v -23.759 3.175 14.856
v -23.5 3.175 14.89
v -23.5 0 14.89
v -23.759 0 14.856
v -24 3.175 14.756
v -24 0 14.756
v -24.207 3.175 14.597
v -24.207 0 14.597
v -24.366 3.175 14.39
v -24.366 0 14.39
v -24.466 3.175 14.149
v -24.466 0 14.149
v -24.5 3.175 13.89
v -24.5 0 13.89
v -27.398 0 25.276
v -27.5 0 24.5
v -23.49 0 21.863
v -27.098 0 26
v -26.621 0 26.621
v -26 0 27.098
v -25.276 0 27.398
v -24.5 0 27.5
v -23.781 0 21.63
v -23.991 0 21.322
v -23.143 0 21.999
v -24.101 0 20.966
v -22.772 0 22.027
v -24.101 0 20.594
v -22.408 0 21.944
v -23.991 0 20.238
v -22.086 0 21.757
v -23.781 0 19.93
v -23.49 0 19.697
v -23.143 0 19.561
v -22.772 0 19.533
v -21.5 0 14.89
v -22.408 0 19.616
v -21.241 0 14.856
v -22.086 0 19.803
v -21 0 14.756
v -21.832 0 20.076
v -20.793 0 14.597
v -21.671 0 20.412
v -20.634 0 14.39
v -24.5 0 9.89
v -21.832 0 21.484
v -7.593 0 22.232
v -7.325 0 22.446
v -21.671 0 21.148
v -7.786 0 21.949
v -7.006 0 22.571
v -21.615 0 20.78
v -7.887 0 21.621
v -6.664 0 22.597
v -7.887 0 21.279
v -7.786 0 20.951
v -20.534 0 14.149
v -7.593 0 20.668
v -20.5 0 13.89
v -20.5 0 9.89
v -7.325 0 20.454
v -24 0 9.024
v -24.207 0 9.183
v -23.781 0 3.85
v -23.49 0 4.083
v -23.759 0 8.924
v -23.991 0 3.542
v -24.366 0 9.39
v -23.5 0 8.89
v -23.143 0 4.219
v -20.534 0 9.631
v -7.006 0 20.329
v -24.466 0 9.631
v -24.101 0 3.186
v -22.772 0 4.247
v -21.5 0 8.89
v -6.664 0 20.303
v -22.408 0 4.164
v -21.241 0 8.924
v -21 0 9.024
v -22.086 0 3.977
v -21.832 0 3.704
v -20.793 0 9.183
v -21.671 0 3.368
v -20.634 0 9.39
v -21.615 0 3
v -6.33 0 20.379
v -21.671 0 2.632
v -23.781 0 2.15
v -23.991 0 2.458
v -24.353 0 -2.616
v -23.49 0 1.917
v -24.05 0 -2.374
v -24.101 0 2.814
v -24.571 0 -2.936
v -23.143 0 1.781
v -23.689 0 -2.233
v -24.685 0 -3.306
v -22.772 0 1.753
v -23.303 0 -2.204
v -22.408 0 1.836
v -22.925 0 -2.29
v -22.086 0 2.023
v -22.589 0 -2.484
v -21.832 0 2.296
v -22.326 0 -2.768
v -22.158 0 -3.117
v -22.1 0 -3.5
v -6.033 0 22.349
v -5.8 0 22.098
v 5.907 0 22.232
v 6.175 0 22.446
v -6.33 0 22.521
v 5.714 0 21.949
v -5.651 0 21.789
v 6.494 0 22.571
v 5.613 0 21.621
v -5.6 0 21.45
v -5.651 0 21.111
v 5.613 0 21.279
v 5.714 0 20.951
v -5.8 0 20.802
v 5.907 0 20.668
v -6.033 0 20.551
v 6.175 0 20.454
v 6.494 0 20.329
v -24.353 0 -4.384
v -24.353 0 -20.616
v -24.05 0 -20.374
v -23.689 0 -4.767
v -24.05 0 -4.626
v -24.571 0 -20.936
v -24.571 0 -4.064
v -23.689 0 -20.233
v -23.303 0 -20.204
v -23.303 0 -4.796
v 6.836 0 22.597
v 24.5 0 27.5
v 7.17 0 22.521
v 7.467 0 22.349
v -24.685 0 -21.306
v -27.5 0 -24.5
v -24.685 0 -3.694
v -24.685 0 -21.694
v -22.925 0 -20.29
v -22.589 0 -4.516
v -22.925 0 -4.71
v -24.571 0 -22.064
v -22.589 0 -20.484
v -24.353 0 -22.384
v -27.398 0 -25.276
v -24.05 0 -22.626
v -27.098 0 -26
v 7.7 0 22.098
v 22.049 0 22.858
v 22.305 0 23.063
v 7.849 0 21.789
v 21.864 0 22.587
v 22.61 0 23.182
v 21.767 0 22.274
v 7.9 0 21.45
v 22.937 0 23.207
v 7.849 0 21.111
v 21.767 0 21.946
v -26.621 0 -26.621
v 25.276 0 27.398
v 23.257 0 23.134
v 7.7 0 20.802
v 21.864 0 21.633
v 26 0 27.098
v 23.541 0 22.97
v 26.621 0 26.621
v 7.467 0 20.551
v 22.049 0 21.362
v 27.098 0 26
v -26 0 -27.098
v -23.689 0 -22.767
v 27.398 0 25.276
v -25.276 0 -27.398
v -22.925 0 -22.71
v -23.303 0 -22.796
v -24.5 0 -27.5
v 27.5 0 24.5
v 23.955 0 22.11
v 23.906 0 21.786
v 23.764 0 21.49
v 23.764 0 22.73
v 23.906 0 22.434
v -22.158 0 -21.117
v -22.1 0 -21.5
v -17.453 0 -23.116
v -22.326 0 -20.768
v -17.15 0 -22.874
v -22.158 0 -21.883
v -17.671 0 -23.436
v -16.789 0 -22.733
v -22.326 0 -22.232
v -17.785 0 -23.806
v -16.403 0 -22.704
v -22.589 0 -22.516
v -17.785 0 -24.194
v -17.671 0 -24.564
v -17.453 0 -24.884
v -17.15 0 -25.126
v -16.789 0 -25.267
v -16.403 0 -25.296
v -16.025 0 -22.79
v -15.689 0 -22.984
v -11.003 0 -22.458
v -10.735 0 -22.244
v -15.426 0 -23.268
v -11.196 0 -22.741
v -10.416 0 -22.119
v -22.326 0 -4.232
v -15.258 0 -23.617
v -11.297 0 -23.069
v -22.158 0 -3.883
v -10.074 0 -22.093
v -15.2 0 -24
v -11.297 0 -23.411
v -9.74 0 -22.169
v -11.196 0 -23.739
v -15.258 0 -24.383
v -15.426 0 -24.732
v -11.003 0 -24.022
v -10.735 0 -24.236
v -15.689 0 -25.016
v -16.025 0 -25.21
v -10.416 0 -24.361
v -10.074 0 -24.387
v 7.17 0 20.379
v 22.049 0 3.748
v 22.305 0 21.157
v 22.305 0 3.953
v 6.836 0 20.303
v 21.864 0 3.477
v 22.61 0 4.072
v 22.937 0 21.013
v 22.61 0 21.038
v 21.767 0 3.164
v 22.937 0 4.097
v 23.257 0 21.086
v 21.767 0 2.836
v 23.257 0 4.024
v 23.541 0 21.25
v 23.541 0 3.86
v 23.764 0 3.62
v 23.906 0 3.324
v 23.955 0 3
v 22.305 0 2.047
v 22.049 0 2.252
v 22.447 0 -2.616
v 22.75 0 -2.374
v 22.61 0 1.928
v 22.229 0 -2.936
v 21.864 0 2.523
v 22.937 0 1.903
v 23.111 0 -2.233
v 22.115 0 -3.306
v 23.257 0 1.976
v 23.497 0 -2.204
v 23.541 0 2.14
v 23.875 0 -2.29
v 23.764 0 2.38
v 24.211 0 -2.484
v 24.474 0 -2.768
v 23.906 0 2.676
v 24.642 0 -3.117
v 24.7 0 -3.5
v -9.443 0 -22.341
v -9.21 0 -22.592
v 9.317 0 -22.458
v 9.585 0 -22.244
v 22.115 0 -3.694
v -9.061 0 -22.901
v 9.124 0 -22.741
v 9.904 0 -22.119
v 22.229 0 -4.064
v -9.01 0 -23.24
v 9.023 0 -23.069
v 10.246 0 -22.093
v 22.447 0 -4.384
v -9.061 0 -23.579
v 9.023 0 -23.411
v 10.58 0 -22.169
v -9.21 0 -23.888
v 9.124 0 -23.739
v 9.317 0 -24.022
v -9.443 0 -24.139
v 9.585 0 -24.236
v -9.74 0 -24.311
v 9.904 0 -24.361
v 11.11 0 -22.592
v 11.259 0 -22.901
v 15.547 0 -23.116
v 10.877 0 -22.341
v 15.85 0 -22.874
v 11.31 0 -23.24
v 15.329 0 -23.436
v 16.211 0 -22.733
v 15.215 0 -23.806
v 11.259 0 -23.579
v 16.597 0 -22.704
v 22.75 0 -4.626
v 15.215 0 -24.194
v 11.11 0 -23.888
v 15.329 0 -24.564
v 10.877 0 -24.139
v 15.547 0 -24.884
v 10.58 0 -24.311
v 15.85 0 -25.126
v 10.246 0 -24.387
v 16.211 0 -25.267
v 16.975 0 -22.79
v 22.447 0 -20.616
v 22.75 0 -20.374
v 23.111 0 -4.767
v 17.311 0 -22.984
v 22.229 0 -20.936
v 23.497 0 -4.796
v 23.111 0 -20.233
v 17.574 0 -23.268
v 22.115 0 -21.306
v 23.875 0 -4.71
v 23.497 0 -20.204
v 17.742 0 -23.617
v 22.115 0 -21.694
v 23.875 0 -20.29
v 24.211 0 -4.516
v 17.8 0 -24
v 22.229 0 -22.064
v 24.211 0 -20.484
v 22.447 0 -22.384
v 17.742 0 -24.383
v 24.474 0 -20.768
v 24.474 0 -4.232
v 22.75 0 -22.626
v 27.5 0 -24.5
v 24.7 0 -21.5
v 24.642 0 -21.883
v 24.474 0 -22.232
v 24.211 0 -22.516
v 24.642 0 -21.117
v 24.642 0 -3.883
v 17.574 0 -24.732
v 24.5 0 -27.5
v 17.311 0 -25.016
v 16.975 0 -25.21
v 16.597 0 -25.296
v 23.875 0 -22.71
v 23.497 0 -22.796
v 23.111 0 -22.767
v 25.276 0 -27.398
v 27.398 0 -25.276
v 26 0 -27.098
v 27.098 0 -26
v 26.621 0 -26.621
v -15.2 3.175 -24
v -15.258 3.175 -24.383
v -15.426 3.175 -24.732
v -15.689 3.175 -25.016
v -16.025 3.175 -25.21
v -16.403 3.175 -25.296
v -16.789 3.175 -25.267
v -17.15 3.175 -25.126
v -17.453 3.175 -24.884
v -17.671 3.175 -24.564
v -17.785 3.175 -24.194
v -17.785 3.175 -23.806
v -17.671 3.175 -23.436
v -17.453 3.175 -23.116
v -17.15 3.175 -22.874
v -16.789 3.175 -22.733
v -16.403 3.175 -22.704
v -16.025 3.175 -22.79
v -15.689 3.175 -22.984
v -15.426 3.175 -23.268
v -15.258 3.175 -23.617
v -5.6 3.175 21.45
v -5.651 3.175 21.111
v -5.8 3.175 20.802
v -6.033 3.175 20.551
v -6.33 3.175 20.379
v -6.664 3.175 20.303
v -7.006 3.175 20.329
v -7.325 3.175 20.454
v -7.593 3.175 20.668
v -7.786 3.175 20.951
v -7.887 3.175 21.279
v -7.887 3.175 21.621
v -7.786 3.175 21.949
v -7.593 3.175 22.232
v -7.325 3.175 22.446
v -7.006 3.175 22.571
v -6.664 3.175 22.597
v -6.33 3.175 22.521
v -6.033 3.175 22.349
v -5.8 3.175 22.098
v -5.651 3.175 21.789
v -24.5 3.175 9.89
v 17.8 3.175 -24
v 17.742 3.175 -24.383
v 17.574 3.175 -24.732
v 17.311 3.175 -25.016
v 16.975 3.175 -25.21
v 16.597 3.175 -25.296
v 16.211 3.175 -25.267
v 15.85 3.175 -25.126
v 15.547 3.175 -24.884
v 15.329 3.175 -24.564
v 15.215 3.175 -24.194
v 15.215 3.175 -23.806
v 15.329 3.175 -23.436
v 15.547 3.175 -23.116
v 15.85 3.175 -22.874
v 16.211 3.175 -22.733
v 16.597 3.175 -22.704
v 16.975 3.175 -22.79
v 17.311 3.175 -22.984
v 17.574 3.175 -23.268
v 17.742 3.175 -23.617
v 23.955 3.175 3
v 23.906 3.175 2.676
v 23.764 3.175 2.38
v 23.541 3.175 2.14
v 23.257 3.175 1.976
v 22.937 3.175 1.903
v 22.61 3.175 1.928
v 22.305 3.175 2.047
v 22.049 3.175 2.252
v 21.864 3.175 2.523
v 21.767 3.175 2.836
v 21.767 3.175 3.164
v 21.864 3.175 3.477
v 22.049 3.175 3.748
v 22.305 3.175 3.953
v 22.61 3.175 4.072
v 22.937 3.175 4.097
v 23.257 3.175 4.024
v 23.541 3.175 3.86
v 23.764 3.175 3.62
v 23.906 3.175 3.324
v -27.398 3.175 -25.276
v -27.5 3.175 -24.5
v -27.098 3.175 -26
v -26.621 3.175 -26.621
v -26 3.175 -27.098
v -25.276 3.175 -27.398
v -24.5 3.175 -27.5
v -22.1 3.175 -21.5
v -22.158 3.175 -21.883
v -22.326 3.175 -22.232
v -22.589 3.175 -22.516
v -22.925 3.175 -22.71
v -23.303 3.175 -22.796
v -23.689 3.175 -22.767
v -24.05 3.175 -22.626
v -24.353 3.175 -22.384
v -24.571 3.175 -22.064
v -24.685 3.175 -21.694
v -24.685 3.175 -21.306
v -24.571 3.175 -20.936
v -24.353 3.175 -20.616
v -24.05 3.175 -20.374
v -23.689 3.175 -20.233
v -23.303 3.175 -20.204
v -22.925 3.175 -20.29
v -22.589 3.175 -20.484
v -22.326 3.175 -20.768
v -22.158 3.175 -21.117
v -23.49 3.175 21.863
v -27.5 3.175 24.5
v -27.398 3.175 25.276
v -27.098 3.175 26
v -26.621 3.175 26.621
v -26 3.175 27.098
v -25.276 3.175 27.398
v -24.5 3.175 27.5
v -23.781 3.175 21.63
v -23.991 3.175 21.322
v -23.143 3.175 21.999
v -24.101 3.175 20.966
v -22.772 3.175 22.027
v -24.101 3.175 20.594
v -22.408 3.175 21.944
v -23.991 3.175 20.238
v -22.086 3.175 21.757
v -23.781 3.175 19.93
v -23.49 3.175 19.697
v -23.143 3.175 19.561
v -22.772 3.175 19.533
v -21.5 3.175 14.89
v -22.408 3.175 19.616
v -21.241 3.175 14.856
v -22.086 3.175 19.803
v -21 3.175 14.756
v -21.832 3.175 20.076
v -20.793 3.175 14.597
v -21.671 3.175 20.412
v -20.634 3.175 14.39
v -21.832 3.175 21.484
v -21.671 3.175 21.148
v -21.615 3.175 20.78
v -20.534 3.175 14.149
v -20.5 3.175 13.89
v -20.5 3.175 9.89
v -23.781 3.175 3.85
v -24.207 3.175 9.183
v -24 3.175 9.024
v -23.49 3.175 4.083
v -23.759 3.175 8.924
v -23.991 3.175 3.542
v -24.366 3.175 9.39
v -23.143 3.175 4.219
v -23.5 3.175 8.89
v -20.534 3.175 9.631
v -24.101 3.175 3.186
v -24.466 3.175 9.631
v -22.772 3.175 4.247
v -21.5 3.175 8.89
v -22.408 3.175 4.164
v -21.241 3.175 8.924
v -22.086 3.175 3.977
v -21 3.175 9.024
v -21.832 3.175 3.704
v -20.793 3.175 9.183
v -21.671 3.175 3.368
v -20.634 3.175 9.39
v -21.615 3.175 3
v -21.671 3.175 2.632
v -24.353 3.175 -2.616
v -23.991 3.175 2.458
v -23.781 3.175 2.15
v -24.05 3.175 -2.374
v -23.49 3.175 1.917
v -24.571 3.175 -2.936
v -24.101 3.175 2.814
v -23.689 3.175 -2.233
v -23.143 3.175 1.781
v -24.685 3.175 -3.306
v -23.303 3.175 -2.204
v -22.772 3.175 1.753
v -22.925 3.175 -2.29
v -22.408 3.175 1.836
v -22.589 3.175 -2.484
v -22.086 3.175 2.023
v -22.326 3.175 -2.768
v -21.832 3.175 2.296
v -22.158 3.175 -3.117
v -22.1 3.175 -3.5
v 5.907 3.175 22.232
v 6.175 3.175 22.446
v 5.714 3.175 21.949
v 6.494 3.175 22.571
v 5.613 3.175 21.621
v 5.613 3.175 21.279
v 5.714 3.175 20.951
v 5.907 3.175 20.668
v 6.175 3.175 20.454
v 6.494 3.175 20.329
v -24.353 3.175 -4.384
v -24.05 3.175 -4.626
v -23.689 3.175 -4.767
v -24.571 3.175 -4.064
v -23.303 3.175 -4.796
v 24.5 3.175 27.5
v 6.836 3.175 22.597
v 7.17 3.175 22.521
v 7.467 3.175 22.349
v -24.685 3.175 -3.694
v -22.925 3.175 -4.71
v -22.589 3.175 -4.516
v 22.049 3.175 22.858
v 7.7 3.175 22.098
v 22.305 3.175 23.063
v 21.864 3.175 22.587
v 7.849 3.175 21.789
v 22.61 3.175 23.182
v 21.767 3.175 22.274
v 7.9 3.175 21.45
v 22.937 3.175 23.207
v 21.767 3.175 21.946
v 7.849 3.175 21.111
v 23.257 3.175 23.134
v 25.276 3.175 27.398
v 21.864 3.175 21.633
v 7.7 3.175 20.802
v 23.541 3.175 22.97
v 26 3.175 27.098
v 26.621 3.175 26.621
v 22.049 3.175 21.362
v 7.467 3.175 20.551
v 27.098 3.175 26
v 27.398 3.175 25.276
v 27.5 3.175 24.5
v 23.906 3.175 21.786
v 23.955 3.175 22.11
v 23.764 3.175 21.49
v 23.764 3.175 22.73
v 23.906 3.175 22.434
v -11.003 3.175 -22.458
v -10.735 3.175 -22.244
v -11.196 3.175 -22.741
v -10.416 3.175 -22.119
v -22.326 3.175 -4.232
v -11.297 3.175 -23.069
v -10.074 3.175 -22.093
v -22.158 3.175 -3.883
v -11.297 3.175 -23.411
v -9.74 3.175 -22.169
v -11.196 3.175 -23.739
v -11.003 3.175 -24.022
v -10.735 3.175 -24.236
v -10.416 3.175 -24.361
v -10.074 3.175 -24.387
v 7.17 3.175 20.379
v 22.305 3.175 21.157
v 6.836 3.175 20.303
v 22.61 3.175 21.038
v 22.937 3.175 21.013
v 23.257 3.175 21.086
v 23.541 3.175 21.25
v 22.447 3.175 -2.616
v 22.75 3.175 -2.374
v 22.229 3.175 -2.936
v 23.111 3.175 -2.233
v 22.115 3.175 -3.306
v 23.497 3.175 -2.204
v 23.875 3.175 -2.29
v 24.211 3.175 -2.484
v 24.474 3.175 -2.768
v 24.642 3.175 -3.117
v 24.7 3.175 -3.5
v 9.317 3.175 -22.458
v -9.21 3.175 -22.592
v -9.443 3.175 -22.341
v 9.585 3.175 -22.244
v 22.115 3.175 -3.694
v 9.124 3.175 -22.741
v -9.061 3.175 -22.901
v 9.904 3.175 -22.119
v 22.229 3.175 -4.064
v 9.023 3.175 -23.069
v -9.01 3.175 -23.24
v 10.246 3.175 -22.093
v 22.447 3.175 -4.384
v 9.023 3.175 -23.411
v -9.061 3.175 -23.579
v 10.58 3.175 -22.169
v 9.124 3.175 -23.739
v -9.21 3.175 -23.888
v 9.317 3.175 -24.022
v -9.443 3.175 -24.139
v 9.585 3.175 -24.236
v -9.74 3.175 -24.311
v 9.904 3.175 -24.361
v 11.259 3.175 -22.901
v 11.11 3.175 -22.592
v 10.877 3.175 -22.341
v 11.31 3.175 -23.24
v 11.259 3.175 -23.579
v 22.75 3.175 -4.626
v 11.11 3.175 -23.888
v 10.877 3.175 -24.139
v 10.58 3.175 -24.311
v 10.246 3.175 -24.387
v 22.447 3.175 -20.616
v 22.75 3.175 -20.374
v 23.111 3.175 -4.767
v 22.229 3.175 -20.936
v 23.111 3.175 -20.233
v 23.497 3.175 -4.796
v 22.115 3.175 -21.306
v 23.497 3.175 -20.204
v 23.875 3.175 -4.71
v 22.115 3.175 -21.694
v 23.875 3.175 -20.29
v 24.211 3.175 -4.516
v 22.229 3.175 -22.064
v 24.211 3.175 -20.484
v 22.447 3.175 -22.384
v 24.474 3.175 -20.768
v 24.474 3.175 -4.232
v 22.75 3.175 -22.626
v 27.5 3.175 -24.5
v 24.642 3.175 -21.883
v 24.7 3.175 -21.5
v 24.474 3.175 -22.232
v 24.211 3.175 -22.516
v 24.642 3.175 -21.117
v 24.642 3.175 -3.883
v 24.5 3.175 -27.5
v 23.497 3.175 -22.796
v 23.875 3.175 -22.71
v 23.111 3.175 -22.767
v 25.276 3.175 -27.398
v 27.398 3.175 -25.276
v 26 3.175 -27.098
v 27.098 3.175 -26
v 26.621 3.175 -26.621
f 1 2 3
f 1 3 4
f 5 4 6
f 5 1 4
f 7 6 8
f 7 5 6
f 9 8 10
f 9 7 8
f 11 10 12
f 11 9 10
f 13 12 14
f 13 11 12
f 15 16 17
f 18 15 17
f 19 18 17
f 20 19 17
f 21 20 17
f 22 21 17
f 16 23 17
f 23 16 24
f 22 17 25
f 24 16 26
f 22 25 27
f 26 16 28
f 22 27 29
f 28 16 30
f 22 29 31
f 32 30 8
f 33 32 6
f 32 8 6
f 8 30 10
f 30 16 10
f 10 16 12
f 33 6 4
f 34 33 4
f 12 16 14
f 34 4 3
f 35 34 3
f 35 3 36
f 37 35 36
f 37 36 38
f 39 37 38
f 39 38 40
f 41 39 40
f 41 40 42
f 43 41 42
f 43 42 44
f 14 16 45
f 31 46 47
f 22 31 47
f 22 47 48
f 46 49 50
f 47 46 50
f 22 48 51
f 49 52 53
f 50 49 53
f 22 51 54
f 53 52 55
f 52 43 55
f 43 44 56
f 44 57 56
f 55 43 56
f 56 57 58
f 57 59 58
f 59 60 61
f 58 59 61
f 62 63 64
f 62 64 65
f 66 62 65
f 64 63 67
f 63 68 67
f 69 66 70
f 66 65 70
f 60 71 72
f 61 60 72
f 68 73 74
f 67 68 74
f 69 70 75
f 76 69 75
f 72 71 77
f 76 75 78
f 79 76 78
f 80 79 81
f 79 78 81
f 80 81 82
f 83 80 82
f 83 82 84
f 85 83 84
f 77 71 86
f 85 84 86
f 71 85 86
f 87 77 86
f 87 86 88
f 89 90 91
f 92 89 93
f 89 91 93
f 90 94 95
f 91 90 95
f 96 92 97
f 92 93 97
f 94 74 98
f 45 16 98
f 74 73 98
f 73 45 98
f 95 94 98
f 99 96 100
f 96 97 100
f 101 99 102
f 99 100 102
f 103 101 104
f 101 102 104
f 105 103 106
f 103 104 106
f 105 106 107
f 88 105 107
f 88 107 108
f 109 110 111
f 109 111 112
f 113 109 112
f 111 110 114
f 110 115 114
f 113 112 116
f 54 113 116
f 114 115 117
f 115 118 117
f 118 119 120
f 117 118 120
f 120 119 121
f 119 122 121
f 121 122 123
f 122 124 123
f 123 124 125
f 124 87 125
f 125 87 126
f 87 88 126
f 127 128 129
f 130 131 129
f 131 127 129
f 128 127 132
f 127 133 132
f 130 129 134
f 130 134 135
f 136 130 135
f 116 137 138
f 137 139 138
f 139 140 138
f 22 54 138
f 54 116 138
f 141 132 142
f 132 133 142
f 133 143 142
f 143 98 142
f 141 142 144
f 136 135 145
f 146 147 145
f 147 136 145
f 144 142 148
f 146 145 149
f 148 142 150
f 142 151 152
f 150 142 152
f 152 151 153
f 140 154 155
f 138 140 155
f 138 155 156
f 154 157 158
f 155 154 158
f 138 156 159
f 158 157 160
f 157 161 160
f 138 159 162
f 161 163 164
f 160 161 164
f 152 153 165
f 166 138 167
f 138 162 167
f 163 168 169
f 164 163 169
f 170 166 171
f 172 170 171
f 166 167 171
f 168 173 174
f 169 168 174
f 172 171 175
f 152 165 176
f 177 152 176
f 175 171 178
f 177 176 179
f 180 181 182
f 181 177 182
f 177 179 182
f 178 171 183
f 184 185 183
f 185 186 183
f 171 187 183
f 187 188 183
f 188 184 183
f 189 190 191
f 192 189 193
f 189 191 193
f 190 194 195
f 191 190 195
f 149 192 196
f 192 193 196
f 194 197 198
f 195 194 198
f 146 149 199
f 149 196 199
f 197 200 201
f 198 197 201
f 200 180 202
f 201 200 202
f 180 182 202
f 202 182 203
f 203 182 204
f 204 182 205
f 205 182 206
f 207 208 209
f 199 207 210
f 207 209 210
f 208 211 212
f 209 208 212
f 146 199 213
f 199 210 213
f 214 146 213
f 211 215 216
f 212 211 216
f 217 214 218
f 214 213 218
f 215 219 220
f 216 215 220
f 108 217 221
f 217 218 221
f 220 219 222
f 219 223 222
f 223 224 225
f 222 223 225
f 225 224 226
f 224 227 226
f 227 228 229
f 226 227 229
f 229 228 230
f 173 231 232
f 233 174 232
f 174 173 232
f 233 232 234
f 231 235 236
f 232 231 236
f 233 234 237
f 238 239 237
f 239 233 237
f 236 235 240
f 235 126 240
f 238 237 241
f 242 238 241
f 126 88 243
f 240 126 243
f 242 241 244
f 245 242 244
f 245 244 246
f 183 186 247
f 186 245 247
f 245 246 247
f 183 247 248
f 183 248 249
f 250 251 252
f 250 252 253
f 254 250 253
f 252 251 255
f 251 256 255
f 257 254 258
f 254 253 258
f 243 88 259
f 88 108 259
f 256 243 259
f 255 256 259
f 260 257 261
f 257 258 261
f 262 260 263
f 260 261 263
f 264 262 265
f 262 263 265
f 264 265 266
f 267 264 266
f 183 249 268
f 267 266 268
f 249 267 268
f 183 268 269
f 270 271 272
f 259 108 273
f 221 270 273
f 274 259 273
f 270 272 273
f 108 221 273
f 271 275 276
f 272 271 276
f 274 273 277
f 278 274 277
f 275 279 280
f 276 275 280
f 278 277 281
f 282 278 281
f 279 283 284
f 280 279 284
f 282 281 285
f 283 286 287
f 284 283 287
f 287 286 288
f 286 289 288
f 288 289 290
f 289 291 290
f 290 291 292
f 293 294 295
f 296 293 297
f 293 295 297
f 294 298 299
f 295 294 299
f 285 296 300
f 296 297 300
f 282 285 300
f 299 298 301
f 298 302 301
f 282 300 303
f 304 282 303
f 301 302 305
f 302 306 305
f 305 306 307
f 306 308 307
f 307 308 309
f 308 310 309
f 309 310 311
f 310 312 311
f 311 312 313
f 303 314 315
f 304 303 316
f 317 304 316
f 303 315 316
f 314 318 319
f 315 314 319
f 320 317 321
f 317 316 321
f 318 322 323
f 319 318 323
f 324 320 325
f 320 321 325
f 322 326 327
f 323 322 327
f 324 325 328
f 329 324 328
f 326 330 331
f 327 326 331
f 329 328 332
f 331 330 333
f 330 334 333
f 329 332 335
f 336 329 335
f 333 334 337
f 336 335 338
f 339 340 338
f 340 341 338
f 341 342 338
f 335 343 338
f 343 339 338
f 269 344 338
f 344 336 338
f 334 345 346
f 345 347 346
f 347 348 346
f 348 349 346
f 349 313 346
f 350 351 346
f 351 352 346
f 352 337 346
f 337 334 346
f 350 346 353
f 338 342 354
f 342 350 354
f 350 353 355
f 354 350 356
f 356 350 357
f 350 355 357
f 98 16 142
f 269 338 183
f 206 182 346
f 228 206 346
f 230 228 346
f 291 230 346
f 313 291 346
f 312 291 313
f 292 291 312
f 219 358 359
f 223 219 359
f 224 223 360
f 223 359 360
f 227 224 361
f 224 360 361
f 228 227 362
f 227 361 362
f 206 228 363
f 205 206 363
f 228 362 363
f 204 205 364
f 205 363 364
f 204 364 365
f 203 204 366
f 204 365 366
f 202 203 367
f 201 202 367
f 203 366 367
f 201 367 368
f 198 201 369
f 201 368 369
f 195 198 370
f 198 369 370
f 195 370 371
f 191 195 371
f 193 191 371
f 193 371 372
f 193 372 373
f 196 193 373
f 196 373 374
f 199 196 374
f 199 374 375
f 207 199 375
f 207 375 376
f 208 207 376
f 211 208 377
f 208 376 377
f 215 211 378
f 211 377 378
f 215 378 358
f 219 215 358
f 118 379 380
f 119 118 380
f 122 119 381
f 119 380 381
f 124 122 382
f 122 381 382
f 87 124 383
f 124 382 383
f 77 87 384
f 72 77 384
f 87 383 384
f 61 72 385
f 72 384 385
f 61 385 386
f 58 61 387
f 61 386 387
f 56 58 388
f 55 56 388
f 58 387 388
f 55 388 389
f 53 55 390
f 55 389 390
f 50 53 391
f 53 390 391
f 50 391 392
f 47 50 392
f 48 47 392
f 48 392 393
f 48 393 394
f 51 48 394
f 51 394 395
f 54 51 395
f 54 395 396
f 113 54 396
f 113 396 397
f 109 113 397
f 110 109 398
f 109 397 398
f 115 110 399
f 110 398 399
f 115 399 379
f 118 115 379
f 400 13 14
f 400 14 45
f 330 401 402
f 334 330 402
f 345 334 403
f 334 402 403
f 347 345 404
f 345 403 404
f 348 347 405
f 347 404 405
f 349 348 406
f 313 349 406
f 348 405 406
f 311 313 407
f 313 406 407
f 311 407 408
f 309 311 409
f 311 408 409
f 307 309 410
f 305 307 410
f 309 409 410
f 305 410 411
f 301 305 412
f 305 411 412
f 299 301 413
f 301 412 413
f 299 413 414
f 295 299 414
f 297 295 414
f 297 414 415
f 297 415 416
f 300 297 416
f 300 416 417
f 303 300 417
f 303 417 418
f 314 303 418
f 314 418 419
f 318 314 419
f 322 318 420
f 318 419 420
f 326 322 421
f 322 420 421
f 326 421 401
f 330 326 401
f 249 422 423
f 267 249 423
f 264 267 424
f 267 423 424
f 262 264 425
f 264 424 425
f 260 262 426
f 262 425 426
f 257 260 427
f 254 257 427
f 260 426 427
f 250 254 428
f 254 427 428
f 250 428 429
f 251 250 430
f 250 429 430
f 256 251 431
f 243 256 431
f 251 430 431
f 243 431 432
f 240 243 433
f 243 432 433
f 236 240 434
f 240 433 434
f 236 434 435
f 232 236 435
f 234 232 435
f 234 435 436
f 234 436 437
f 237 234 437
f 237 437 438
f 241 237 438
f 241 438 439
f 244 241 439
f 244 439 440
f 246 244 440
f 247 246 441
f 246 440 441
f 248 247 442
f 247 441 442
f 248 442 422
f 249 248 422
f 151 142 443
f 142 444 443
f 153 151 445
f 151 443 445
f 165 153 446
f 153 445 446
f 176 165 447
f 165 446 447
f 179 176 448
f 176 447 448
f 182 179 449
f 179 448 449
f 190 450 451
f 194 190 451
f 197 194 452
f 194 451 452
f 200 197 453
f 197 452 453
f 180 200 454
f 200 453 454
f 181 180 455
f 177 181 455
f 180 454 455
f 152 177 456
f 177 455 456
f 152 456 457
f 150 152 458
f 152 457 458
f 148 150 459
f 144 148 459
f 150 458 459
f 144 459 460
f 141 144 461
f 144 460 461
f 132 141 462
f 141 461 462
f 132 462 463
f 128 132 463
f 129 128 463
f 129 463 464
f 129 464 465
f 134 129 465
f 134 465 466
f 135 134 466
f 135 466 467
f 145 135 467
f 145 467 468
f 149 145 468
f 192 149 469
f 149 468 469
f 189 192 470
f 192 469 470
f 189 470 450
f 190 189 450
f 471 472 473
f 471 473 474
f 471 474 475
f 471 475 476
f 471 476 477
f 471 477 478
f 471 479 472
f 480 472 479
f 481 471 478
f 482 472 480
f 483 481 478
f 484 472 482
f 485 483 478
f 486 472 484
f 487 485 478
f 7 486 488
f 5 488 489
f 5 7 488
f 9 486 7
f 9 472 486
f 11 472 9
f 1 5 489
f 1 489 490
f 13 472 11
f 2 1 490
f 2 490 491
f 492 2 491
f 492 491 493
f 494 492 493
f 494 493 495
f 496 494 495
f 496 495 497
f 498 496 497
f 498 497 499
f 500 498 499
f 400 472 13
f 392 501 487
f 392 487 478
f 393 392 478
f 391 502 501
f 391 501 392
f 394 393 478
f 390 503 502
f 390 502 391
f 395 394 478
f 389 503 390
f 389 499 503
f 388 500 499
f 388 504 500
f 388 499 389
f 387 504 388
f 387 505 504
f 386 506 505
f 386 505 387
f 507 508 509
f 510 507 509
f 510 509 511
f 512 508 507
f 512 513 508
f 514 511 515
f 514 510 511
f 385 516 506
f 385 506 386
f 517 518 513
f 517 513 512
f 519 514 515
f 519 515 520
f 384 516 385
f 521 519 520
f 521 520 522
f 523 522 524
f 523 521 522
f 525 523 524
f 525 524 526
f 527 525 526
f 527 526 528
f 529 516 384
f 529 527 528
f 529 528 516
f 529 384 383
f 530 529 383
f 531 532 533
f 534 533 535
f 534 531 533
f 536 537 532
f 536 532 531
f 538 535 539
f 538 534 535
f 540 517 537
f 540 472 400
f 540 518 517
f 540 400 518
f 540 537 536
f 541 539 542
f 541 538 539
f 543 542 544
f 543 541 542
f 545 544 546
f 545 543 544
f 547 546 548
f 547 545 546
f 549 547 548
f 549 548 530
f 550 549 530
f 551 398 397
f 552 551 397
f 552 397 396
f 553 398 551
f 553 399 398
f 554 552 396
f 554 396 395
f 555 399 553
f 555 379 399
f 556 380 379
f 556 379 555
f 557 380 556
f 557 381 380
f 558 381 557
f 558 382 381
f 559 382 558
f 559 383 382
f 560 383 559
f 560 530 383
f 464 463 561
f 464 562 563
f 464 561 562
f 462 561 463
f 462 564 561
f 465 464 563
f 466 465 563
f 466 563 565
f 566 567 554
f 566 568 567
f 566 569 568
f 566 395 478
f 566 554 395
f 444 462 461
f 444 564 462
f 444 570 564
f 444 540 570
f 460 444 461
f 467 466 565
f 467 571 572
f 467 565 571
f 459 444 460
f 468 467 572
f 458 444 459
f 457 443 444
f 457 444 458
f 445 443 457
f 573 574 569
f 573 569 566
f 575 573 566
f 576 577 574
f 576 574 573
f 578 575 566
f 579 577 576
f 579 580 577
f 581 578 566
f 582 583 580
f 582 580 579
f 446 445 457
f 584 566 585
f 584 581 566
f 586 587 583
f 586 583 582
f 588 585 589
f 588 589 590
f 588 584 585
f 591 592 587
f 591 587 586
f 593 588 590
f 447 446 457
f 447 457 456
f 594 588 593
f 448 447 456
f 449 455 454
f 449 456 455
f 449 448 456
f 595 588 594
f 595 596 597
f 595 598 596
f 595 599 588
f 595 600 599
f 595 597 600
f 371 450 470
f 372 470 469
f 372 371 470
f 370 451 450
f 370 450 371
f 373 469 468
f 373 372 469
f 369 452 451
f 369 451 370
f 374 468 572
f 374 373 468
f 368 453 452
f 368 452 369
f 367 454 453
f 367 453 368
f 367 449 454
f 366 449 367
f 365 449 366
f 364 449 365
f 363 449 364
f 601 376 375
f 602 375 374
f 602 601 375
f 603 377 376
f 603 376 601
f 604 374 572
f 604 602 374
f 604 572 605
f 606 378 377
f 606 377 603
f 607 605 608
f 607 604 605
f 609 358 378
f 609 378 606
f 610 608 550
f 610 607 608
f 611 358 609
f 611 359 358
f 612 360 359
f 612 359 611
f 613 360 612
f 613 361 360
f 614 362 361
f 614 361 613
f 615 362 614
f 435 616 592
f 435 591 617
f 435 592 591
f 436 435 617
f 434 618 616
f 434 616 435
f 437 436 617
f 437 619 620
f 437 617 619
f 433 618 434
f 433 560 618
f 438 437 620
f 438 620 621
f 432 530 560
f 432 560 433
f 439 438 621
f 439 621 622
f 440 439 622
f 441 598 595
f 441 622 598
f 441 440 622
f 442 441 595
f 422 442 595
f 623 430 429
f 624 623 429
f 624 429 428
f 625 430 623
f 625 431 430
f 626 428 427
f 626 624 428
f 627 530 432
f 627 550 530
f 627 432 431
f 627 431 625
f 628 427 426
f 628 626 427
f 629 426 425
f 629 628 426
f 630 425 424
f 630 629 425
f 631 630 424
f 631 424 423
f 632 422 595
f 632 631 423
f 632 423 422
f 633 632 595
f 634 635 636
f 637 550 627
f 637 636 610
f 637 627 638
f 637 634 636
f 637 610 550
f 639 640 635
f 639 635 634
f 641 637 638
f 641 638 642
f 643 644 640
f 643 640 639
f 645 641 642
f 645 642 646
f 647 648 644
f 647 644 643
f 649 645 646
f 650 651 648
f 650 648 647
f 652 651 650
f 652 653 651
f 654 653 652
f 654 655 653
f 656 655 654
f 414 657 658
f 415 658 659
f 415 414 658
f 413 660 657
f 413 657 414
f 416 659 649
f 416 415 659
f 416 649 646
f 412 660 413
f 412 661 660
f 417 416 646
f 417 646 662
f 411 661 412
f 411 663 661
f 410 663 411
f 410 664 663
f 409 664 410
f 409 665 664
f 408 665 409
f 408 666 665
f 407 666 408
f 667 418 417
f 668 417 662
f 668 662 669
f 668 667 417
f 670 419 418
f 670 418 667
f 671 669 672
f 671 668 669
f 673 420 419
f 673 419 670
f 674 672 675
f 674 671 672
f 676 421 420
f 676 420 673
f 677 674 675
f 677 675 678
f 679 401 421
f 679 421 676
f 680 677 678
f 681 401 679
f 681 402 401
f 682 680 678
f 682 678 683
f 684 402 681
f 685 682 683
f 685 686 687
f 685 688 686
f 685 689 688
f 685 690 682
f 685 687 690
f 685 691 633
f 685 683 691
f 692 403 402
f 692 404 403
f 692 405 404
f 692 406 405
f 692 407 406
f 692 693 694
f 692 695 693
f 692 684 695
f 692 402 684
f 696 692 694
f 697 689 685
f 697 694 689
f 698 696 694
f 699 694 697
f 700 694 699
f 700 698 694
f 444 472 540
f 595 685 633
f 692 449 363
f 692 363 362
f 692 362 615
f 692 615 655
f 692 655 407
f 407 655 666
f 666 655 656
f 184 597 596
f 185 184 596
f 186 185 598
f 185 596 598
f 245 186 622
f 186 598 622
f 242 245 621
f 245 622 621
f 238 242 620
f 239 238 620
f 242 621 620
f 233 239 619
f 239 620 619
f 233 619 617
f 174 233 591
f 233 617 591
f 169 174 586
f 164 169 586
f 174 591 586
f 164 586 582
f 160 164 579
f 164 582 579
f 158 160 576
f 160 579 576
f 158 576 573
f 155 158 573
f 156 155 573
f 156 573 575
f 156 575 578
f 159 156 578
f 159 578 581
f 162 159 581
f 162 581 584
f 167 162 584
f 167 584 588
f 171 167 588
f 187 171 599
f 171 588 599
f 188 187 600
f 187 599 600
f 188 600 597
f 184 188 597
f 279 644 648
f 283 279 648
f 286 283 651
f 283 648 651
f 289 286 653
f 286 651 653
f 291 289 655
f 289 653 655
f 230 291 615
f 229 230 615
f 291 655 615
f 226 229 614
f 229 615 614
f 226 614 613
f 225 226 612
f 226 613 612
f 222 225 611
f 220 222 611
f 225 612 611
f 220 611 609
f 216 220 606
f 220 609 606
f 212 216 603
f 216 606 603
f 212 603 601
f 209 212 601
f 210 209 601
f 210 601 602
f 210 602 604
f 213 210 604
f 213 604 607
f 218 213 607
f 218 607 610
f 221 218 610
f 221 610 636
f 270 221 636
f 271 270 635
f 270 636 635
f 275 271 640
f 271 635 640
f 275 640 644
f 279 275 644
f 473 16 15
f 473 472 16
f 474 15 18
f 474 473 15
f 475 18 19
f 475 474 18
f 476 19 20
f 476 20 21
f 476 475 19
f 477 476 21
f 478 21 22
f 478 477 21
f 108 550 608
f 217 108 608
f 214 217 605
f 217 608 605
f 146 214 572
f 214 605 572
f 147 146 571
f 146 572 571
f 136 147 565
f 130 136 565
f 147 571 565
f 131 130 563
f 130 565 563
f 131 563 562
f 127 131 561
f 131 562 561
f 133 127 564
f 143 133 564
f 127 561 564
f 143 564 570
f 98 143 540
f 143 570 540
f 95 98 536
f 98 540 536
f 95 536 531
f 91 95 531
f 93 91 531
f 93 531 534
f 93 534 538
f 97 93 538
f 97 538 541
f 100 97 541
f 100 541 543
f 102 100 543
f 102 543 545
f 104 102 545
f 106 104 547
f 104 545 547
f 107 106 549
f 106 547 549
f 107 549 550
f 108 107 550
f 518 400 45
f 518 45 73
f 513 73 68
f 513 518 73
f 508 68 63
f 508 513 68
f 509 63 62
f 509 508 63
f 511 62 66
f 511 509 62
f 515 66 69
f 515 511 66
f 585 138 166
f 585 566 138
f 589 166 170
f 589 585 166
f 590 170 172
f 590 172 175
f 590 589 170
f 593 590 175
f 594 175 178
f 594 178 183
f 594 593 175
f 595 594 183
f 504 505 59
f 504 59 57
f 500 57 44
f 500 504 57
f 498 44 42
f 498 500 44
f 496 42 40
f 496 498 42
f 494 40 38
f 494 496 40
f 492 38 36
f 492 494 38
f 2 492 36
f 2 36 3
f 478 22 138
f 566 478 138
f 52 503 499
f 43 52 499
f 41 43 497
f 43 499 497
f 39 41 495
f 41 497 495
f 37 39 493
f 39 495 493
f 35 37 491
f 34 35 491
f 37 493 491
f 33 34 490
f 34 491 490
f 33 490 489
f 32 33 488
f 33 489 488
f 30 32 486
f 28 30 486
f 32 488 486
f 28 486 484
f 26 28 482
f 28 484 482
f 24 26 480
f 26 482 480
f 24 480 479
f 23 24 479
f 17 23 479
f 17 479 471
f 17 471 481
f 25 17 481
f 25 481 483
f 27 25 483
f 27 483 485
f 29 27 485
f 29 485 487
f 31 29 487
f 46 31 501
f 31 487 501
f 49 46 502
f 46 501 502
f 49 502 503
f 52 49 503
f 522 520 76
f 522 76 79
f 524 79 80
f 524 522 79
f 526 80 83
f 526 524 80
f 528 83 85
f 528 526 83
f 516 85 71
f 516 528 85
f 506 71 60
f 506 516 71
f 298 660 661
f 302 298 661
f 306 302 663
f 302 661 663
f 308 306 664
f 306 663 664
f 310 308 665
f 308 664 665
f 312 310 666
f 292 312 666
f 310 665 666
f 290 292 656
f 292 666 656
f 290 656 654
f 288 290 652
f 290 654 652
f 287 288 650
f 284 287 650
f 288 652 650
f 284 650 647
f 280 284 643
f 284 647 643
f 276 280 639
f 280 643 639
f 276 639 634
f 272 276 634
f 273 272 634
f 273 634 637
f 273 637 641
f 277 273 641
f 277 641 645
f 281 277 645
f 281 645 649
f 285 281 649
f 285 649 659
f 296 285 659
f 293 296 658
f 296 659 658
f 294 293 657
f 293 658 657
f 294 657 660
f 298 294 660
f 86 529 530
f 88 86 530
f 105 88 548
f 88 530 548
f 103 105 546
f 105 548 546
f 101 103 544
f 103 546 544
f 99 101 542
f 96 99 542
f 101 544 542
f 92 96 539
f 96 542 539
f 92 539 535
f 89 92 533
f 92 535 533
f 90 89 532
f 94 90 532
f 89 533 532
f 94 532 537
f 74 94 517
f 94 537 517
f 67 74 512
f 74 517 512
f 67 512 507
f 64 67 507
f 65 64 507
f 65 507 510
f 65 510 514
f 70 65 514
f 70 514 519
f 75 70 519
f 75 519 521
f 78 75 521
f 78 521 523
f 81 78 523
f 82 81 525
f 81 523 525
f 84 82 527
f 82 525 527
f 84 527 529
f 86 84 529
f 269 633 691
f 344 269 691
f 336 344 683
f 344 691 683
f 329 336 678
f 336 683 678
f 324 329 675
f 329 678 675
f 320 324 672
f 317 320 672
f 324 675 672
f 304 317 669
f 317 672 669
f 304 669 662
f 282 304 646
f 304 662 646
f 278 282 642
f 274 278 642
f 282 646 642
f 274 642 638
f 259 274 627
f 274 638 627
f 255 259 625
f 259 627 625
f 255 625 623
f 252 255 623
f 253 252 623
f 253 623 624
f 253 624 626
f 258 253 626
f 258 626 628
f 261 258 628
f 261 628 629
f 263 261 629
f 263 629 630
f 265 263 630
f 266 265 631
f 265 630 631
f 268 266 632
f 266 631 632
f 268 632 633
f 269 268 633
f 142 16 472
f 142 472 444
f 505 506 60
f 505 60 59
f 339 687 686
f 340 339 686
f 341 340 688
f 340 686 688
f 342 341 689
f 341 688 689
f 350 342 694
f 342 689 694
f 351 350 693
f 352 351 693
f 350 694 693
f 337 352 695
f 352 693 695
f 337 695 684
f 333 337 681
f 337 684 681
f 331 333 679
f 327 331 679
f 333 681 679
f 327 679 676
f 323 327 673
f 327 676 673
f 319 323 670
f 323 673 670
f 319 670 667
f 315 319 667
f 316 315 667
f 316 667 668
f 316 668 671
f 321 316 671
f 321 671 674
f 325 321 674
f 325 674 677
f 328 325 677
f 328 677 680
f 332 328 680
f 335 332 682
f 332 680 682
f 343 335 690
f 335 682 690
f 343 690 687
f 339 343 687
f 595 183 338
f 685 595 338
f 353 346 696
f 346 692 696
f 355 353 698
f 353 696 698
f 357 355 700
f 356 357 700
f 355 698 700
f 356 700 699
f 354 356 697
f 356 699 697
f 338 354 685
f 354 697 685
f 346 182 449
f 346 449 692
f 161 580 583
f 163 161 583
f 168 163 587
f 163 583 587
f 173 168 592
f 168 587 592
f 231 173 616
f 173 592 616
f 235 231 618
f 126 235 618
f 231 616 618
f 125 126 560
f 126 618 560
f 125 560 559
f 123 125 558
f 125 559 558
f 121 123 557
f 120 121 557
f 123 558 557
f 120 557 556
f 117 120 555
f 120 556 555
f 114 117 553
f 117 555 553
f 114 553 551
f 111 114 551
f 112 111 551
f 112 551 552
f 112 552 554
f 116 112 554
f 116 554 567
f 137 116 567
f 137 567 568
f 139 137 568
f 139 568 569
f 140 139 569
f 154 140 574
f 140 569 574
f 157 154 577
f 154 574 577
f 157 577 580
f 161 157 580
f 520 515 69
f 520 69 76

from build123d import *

# Parameters (mm, degrees)
SKETCH1_W           = 55
SKETCH1_H           = 55
BOSS_EXTRUDE1_DEPTH = 3.175
SKETCH2_R           = 1.3
CUT_EXTRUDE1_DEPTH  = 3.175
FILLET1_R           = 3
SKETCH3_R           = 1.25
SKETCH3_R_2         = 1.1
CUT_EXTRUDE2_DEPTH  = 3.175
SKETCH4_R           = 1.15
CUT_EXTRUDE3_DEPTH  = 3.175
SKETCH5_R           = 1.15
CUT_EXTRUDE4_DEPTH  = 3.175
SKETCH6_R           = 1.3
CUT_EXTRUDE5_DEPTH  = 3.175
CUT_EXTRUDE6_DEPTH  = 3.175


with BuildPart() as part:
    # Sketch1 → Boss-Extrude1 (new body)
    with BuildSketch(Plane(origin=(0, 0, 0), x_dir=(1, 0, 0), z_dir=(0, 1, 0))):
        Rectangle(SKETCH1_W, SKETCH1_H)
    extrude(amount=BOSS_EXTRUDE1_DEPTH)

    # Sketch2 → Cut-Extrude1 (cut)
    with BuildSketch(Plane(origin=(0, 3.175, 0), x_dir=(1, 0, 0), z_dir=(0, 1, 0))):
        with Locations((-23.4, 21.5)):
            Circle(SKETCH2_R)
        with Locations((-23.4, 3.5)):
            Circle(SKETCH2_R)
        with Locations((23.4, 3.5)):
            Circle(SKETCH2_R)
        with Locations((23.4, 21.5)):
            Circle(SKETCH2_R)
    extrude(amount=-CUT_EXTRUDE1_DEPTH, mode=Mode.SUBTRACT)

    # Fillet1
    fillet1_edges = [part.edges().sort_by_distance(p)[0] for p in [
        (27.5, 1.5875, 27.5),
        (-27.5, 1.5875, 27.5),
        (-27.5, 1.5875, -27.5),
        (27.5, 1.5875, -27.5),
    ]]
    fillet(fillet1_edges, radius=FILLET1_R)

    # Sketch3 → Cut-Extrude2 (cut)
    with BuildSketch(Plane(origin=(0, 3.175, 0), x_dir=(1, 0, 0), z_dir=(0, 1, 0))):
        with Locations((-22.865, -3)):
            Circle(SKETCH3_R)
        with Locations((22.855, -3)):
            Circle(SKETCH3_R_2)
        with Locations((22.855, -22.11)):
            Circle(SKETCH3_R_2)
        with Locations((-22.865, -20.78)):
            Circle(SKETCH3_R)
    extrude(amount=-CUT_EXTRUDE2_DEPTH, mode=Mode.SUBTRACT)

    # Sketch4 → Cut-Extrude3 (cut)
    with BuildSketch(Plane(origin=(0, 3.175, 0), x_dir=(1, 0, 0), z_dir=(0, 1, 0))):
        with Locations((-10.16, 23.24)):
            Circle(SKETCH4_R)
        with Locations((10.16, 23.24)):
            Circle(SKETCH4_R)
    extrude(amount=-CUT_EXTRUDE3_DEPTH, mode=Mode.SUBTRACT)

    # Sketch5 → Cut-Extrude4 (cut)
    with BuildSketch(Plane(origin=(0, 3.175, 0), x_dir=(1, 0, 0), z_dir=(0, 1, 0))):
        with Locations((-6.75, -21.45)):
            Circle(SKETCH5_R)
        with Locations((6.75, -21.45)):
            Circle(SKETCH5_R)
    extrude(amount=-CUT_EXTRUDE4_DEPTH, mode=Mode.SUBTRACT)

    # Sketch6 → Cut-Extrude5 (cut)
    with BuildSketch(Plane(origin=(0, 3.175, 0), x_dir=(1, 0, 0), z_dir=(0, 1, 0))):
        with Locations((-16.5, 24)):
            Circle(SKETCH6_R)
        with Locations((16.5, 24)):
            Circle(SKETCH6_R)
    extrude(amount=-CUT_EXTRUDE5_DEPTH, mode=Mode.SUBTRACT)

    # Sketch7 → Cut-Extrude6 (cut)
    with BuildSketch(Plane(origin=(0, 3.175, 0), x_dir=(1, 0, 0), z_dir=(0, 1, 0))):
        with BuildLine():
            Line((-23.5, -8.89), (-21.5, -8.89))
            ThreePointArc((-21.5, -8.89), (-20.792893219, -9.182893219), (-20.5, -9.89))
            Line((-20.5, -9.89), (-20.5, -13.89))
            ThreePointArc((-20.5, -13.89), (-20.792893219, -14.597106781), (-21.5, -14.89))
            Line((-21.5, -14.89), (-23.5, -14.89))
            ThreePointArc((-23.5, -14.89), (-24.207106781, -14.597106781), (-24.5, -13.89))
            Line((-24.5, -13.89), (-24.5, -9.89))
            ThreePointArc((-24.5, -9.89), (-24.207106781, -9.182893219), (-23.5, -8.89))
        make_face()
    extrude(amount=-CUT_EXTRUDE6_DEPTH, mode=Mode.SUBTRACT)


solid = part.part
